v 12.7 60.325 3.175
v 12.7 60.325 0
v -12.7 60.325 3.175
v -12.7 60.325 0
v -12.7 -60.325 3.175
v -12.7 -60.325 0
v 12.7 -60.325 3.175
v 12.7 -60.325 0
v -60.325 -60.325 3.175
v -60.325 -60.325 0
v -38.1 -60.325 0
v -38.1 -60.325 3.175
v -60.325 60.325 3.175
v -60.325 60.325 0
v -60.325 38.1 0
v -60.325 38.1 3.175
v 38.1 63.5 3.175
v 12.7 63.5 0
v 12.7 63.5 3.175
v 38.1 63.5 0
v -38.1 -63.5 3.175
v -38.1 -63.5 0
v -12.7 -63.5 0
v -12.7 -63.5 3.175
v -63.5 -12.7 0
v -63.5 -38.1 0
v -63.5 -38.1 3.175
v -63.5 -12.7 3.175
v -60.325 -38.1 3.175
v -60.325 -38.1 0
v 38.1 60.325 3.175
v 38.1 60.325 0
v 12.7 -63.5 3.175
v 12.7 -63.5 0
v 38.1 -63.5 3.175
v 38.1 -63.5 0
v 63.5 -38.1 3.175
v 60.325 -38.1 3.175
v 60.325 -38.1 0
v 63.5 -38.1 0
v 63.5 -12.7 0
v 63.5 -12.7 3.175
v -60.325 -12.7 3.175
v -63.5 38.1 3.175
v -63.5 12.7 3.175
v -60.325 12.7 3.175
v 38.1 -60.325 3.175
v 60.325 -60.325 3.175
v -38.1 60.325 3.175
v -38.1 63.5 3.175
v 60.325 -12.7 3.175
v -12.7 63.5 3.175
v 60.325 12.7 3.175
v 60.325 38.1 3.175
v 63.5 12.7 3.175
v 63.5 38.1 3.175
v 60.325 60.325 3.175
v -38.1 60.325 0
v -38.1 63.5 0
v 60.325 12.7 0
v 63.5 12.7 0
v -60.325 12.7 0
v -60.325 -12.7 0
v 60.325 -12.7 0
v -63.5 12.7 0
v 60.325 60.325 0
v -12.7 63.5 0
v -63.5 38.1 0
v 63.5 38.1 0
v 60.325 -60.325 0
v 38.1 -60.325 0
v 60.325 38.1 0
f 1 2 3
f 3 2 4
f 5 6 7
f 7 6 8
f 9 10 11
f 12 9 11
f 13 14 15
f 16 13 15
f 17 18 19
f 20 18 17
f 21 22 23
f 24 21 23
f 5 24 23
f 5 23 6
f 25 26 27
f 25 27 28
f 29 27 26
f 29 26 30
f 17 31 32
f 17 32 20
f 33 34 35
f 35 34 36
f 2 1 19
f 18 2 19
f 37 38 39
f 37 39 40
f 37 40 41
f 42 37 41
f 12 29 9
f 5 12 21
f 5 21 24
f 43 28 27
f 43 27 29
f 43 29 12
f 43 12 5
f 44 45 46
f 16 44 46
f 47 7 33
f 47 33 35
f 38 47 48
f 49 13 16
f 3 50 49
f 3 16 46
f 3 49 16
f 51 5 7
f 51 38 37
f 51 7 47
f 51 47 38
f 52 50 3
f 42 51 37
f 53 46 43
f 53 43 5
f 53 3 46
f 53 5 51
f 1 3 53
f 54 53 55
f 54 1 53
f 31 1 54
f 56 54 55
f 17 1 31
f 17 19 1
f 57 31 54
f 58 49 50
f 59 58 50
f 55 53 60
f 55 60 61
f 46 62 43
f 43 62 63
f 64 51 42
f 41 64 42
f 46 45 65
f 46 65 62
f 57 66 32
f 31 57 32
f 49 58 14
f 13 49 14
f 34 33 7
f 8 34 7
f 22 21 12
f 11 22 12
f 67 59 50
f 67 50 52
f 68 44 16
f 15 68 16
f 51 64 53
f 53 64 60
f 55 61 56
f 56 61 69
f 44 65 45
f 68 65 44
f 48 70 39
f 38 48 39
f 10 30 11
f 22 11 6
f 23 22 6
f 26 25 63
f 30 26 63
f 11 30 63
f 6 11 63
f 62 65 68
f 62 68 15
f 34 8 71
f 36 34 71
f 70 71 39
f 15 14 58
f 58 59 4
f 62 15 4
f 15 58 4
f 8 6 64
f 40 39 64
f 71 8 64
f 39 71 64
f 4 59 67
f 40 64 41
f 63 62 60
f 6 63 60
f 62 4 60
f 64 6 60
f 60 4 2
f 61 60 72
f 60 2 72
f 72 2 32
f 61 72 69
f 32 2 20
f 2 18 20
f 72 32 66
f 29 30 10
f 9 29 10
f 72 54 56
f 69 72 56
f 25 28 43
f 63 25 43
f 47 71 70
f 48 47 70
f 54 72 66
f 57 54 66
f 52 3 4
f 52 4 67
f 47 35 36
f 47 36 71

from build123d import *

# Parameters (mm, degrees)
F0_W     = 22.225
F0_H     = 22.225
F0_W_2   = 25.4
F0_H_2   = 25.4
F0_H_3   = 3.175
F0_W_3   = 3.175
F1_DEPTH = 3.175


with BuildPart() as f1:
    # F0 (on Top) → F1 (new body)
    with BuildSketch(Plane.XY):
        with Locations((-49.2125, 49.2125)):
            Rectangle(F0_W, F0_H)
        with Locations((-25.4, 49.2125)):
            Rectangle(F0_W_2, F0_H)
        with Locations((25.4, 49.2125)):
            Rectangle(F0_W_2, F0_H)
        with Locations((49.2125, 49.2125)):
            Rectangle(F0_W, F0_H)
        with Locations((49.2125, 25.4)):
            Rectangle(F0_W, F0_H_2)
        with Locations((25.4, 25.4)):
            Rectangle(F0_W_2, F0_H_2)
        with Locations((0, 25.4)):
            Rectangle(F0_W_2, F0_H_2)
        with Locations((-25.4, 25.4)):
            Rectangle(F0_W_2, F0_H_2)
        with Locations((-49.2125, 25.4)):
            Rectangle(F0_W, F0_H_2)
        with Locations((-49.2125, 0)):
            Rectangle(F0_W, F0_H_2)
        with Locations((-25.4, 0)):
            Rectangle(F0_W_2, F0_H_2)
        Rectangle(F0_W_2, F0_H_2)
        with Locations((25.4, 0)):
            Rectangle(F0_W_2, F0_H_2)
        with Locations((49.2125, 0)):
            Rectangle(F0_W, F0_H_2)
        with Locations((49.2125, -25.4)):
            Rectangle(F0_W, F0_H_2)
        with Locations((25.4, -25.4)):
            Rectangle(F0_W_2, F0_H_2)
        with Locations((0, -25.4)):
            Rectangle(F0_W_2, F0_H_2)
        with Locations((-25.4, -25.4)):
            Rectangle(F0_W_2, F0_H_2)
        with Locations((-49.2125, -25.4)):
            Rectangle(F0_W, F0_H_2)
        with Locations((-49.2125, -49.2125)):
            Rectangle(F0_W, F0_H)
        with Locations((-25.4, -49.2125)):
            Rectangle(F0_W_2, F0_H)
        with Locations((25.4, -49.2125)):
            Rectangle(F0_W_2, F0_H)
        with Locations((49.2125, -49.2125)):
            Rectangle(F0_W, F0_H)
        with Locations((0, 49.2125)):
            Rectangle(F0_W_2, F0_H)
        with Locations((0, -49.2125)):
            Rectangle(F0_W_2, F0_H)
        with Locations((-25.4, -61.9125)):
            Rectangle(F0_W_2, F0_H_3)
        with Locations((-61.9125, -25.4)):
            Rectangle(F0_W_3, F0_H_2)
        with Locations((-61.9125, 25.4)):
            Rectangle(F0_W_3, F0_H_2)
        with Locations((-25.4, 61.9125)):
            Rectangle(F0_W_2, F0_H_3)
        with Locations((25.4, 61.9125)):
            Rectangle(F0_W_2, F0_H_3)
        with Locations((61.9125, 25.4)):
            Rectangle(F0_W_3, F0_H_2)
        with Locations((61.9125, -25.4)):
            Rectangle(F0_W_3, F0_H_2)
        with Locations((25.4, -61.9125)):
            Rectangle(F0_W_2, F0_H_3)
    extrude(amount=F1_DEPTH)


solid = f1.part
